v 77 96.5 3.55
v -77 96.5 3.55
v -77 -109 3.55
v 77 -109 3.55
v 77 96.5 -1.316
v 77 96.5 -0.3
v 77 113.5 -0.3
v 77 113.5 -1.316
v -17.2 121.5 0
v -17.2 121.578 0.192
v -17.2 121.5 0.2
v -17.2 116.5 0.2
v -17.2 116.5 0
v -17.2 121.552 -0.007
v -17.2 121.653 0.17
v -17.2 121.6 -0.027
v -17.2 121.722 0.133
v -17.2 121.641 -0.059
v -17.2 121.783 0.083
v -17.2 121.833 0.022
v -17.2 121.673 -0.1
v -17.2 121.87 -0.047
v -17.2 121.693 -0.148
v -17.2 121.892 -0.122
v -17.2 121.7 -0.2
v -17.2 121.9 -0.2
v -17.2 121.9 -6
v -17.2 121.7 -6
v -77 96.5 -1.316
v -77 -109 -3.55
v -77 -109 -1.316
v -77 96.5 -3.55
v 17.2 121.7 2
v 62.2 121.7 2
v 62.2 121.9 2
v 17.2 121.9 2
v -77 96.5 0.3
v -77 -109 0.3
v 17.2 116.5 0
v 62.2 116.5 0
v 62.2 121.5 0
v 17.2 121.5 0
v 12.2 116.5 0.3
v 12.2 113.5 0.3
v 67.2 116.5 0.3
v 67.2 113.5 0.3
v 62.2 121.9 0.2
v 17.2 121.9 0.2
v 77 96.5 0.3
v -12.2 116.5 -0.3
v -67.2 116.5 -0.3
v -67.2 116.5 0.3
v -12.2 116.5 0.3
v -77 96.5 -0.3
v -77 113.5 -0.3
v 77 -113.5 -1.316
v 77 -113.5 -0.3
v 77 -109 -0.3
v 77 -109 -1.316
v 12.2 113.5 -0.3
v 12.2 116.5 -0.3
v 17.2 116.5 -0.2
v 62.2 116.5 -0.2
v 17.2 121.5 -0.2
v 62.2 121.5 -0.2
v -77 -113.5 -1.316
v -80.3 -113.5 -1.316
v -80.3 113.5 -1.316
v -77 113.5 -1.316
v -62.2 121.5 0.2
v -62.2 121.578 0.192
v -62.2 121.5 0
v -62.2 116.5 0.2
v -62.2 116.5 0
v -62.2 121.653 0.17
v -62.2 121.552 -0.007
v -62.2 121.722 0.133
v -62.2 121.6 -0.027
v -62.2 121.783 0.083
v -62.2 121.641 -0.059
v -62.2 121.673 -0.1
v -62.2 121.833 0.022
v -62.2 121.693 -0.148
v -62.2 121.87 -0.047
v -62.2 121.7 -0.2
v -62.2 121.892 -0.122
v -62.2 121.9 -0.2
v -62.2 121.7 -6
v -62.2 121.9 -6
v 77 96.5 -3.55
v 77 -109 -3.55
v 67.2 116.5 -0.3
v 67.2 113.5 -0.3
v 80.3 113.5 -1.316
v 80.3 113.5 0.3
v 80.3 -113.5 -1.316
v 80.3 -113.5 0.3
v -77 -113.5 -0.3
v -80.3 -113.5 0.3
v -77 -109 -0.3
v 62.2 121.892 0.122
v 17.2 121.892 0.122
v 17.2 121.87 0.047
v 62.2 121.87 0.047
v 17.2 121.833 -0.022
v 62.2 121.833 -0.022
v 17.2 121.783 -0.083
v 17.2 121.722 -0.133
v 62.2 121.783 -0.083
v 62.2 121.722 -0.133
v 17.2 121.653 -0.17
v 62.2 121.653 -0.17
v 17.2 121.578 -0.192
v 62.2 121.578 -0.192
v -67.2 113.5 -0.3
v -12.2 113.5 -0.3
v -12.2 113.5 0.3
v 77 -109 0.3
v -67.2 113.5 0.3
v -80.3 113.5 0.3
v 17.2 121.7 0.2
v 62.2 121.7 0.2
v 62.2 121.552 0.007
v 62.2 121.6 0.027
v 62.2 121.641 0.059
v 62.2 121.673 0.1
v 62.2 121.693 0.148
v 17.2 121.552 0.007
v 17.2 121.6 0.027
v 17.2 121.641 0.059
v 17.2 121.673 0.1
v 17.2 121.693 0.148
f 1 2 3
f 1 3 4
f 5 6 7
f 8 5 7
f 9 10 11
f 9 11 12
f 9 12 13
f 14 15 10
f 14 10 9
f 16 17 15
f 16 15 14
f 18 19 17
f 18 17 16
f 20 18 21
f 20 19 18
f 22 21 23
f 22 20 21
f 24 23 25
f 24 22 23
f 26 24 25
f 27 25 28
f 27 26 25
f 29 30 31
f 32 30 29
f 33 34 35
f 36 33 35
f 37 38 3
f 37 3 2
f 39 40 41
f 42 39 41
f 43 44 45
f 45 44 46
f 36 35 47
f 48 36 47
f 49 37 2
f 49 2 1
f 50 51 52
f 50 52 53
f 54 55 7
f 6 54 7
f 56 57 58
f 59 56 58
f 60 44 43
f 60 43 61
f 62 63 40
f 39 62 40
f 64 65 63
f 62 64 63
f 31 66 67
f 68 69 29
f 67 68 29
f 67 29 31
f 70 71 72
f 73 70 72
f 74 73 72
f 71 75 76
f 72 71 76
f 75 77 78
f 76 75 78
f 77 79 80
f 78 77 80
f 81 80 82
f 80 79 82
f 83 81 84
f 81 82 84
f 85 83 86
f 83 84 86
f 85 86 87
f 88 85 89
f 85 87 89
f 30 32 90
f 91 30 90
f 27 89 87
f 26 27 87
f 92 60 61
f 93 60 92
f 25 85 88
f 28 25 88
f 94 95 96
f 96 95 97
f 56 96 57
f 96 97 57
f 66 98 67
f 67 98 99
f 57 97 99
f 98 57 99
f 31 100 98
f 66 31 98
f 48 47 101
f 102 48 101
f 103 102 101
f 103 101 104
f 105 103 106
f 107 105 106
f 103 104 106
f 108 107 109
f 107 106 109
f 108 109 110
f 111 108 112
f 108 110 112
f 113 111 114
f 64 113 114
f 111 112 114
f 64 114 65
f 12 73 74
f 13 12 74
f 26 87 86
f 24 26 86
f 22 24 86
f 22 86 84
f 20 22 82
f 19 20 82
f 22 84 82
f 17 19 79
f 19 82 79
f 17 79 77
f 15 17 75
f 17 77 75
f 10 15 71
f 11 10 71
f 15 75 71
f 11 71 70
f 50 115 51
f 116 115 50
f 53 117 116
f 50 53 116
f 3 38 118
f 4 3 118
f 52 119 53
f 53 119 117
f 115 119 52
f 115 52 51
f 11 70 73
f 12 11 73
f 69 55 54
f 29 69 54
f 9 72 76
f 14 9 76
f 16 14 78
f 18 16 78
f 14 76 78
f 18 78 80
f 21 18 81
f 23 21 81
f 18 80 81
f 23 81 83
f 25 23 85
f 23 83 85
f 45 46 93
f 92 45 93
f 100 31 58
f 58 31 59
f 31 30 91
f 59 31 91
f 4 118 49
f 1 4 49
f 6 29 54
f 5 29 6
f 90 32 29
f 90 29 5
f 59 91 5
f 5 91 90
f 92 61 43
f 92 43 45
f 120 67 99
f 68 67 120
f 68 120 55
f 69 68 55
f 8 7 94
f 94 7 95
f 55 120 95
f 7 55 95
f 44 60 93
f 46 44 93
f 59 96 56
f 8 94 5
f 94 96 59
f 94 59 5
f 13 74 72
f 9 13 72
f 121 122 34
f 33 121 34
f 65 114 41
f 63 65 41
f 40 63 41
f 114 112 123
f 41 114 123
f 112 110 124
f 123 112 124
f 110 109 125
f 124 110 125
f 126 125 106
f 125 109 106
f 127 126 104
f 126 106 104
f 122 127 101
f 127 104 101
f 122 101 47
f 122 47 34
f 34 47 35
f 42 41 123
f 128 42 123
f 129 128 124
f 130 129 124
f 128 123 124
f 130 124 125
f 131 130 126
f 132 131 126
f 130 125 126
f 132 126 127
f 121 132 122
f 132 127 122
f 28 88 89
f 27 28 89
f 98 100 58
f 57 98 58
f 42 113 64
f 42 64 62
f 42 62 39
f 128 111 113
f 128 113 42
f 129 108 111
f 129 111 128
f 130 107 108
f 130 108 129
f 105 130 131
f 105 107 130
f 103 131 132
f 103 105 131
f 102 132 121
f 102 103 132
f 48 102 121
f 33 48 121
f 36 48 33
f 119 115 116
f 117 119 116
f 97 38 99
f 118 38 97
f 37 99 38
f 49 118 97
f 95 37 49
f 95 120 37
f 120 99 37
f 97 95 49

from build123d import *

# Parameters (mm, degrees)
INSULATION_DEPTH      = 0.3
INSULATION_DEPTH_BACK = 0.3
SKETCH1_W             = 160.6
SKETCH1_H             = 227
MAIN_BODY_DEPTH       = 3.55
MAIN_BODY_DEPTH_BACK  = 3.55
SKETCH2_W             = 154
SKETCH2_H             = 205.5
SIDE_FOLDS_DEPTH      = 1.016
SKETCH114_W           = 55
SKETCH114_H           = 0.6
BOSS_EXTRUDE1_DEPTH   = 3
BOSS_EXTRUDE1_2_DEPTH = 3
BASE_FLANGE1_DEPTH    = 45
BASE_FLANGE2_DEPTH    = 45


# Sheet-metal steps are written as plain solids
with BuildPart() as part:
    # Sketch1 → Insulation (new, two sides: drawn at the far end of the back side and taken through both)
    with BuildSketch(Plane.XY.offset(-INSULATION_DEPTH_BACK)):
        Rectangle(SKETCH1_W, SKETCH1_H)
    extrude(amount=INSULATION_DEPTH + INSULATION_DEPTH_BACK)

    # Sketch2 → Main Body (add, two sides: drawn at the far end of the back side and taken through both)
    with BuildSketch(Plane.XY.offset(-MAIN_BODY_DEPTH_BACK)):
        with Locations((0, -6.25)):
            Rectangle(SKETCH2_W, SKETCH2_H)
    extrude(amount=MAIN_BODY_DEPTH + MAIN_BODY_DEPTH_BACK)

    # Sketch5 → Side Folds (add)
    with BuildSketch(Plane(origin=(0, 0, -0.3), x_dir=(-1, 0, 0), z_dir=(0, 0, -1))):
        Polygon((-77, -109), (-77, 96.5), (-77, 113.5), (-80.3, 113.5), (-80.3, -113.5), (-77, -113.5), align=None)
        Polygon((77, 113.5), (77, 96.5), (77, -109), (77, -113.5), (80.3, -113.5), (80.3, 113.5), align=None)
    extrude(amount=SIDE_FOLDS_DEPTH)


with BuildPart() as body_2:
    # Sketch114 → Boss-Extrude1 (new body)
    with BuildSketch(Plane(origin=(0, 113.5, 0), x_dir=(1, 0, 0), z_dir=(0, 1, 0))):
        with Locations((-39.7, 0)):
            Rectangle(SKETCH114_W, SKETCH114_H)
    extrude(amount=BOSS_EXTRUDE1_DEPTH)


with BuildPart() as body_3:
    # Sketch114 → Boss-Extrude1 2 (new body)
    with BuildSketch(Plane(origin=(0, 113.5, 0), x_dir=(1, 0, 0), z_dir=(0, 1, 0))):
        with Locations((39.7, 0)):
            Rectangle(SKETCH114_W, SKETCH114_H)
    extrude(amount=BOSS_EXTRUDE1_2_DEPTH)


with BuildPart() as body_4:
    # Sketch115 → Base-Flange1 (new body)
    with BuildSketch(Plane.ZY.offset(62.2)):
        with BuildLine():
            Line((0, 116.5), (0, 121.5))
            ThreePointArc((0, 121.5), (-0.058578644, 121.641421356), (-0.2, 121.7))
            Line((-0.2, 121.7), (-6, 121.7))
            Line((-6, 121.7), (-6, 121.9))
            Line((-6, 121.9), (-0.2, 121.9))
            ThreePointArc((-0.2, 121.9), (0.082842712, 121.782842712), (0.2, 121.5))
            Line((0.2, 121.5), (0.2, 116.5))
            Line((0.2, 116.5), (0, 116.5))
        make_face()
    extrude(amount=-BASE_FLANGE1_DEPTH)


with BuildPart() as body_5:
    # Sketch120 → Base-Flange2 (new body)
    with BuildSketch(Plane(origin=(62.2, 0, 0), x_dir=(0, 0, -1), z_dir=(1, 0, 0))):
        with BuildLine():
            Line((0, 116.5), (0, 121.5))
            ThreePointArc((0, 121.5), (-0.058578644, 121.641421356), (-0.2, 121.7))
            Line((-0.2, 121.7), (-2, 121.7))
            Line((-2, 121.7), (-2, 121.9))
            Line((-2, 121.9), (-0.2, 121.9))
            ThreePointArc((-0.2, 121.9), (0.082842712, 121.782842712), (0.2, 121.5))
            Line((0.2, 121.5), (0.2, 116.5))
            Line((0.2, 116.5), (0, 116.5))
        make_face()
    extrude(amount=-BASE_FLANGE2_DEPTH)


solid = Compound([part.part, body_2.part, body_3.part, body_4.part, body_5.part])
